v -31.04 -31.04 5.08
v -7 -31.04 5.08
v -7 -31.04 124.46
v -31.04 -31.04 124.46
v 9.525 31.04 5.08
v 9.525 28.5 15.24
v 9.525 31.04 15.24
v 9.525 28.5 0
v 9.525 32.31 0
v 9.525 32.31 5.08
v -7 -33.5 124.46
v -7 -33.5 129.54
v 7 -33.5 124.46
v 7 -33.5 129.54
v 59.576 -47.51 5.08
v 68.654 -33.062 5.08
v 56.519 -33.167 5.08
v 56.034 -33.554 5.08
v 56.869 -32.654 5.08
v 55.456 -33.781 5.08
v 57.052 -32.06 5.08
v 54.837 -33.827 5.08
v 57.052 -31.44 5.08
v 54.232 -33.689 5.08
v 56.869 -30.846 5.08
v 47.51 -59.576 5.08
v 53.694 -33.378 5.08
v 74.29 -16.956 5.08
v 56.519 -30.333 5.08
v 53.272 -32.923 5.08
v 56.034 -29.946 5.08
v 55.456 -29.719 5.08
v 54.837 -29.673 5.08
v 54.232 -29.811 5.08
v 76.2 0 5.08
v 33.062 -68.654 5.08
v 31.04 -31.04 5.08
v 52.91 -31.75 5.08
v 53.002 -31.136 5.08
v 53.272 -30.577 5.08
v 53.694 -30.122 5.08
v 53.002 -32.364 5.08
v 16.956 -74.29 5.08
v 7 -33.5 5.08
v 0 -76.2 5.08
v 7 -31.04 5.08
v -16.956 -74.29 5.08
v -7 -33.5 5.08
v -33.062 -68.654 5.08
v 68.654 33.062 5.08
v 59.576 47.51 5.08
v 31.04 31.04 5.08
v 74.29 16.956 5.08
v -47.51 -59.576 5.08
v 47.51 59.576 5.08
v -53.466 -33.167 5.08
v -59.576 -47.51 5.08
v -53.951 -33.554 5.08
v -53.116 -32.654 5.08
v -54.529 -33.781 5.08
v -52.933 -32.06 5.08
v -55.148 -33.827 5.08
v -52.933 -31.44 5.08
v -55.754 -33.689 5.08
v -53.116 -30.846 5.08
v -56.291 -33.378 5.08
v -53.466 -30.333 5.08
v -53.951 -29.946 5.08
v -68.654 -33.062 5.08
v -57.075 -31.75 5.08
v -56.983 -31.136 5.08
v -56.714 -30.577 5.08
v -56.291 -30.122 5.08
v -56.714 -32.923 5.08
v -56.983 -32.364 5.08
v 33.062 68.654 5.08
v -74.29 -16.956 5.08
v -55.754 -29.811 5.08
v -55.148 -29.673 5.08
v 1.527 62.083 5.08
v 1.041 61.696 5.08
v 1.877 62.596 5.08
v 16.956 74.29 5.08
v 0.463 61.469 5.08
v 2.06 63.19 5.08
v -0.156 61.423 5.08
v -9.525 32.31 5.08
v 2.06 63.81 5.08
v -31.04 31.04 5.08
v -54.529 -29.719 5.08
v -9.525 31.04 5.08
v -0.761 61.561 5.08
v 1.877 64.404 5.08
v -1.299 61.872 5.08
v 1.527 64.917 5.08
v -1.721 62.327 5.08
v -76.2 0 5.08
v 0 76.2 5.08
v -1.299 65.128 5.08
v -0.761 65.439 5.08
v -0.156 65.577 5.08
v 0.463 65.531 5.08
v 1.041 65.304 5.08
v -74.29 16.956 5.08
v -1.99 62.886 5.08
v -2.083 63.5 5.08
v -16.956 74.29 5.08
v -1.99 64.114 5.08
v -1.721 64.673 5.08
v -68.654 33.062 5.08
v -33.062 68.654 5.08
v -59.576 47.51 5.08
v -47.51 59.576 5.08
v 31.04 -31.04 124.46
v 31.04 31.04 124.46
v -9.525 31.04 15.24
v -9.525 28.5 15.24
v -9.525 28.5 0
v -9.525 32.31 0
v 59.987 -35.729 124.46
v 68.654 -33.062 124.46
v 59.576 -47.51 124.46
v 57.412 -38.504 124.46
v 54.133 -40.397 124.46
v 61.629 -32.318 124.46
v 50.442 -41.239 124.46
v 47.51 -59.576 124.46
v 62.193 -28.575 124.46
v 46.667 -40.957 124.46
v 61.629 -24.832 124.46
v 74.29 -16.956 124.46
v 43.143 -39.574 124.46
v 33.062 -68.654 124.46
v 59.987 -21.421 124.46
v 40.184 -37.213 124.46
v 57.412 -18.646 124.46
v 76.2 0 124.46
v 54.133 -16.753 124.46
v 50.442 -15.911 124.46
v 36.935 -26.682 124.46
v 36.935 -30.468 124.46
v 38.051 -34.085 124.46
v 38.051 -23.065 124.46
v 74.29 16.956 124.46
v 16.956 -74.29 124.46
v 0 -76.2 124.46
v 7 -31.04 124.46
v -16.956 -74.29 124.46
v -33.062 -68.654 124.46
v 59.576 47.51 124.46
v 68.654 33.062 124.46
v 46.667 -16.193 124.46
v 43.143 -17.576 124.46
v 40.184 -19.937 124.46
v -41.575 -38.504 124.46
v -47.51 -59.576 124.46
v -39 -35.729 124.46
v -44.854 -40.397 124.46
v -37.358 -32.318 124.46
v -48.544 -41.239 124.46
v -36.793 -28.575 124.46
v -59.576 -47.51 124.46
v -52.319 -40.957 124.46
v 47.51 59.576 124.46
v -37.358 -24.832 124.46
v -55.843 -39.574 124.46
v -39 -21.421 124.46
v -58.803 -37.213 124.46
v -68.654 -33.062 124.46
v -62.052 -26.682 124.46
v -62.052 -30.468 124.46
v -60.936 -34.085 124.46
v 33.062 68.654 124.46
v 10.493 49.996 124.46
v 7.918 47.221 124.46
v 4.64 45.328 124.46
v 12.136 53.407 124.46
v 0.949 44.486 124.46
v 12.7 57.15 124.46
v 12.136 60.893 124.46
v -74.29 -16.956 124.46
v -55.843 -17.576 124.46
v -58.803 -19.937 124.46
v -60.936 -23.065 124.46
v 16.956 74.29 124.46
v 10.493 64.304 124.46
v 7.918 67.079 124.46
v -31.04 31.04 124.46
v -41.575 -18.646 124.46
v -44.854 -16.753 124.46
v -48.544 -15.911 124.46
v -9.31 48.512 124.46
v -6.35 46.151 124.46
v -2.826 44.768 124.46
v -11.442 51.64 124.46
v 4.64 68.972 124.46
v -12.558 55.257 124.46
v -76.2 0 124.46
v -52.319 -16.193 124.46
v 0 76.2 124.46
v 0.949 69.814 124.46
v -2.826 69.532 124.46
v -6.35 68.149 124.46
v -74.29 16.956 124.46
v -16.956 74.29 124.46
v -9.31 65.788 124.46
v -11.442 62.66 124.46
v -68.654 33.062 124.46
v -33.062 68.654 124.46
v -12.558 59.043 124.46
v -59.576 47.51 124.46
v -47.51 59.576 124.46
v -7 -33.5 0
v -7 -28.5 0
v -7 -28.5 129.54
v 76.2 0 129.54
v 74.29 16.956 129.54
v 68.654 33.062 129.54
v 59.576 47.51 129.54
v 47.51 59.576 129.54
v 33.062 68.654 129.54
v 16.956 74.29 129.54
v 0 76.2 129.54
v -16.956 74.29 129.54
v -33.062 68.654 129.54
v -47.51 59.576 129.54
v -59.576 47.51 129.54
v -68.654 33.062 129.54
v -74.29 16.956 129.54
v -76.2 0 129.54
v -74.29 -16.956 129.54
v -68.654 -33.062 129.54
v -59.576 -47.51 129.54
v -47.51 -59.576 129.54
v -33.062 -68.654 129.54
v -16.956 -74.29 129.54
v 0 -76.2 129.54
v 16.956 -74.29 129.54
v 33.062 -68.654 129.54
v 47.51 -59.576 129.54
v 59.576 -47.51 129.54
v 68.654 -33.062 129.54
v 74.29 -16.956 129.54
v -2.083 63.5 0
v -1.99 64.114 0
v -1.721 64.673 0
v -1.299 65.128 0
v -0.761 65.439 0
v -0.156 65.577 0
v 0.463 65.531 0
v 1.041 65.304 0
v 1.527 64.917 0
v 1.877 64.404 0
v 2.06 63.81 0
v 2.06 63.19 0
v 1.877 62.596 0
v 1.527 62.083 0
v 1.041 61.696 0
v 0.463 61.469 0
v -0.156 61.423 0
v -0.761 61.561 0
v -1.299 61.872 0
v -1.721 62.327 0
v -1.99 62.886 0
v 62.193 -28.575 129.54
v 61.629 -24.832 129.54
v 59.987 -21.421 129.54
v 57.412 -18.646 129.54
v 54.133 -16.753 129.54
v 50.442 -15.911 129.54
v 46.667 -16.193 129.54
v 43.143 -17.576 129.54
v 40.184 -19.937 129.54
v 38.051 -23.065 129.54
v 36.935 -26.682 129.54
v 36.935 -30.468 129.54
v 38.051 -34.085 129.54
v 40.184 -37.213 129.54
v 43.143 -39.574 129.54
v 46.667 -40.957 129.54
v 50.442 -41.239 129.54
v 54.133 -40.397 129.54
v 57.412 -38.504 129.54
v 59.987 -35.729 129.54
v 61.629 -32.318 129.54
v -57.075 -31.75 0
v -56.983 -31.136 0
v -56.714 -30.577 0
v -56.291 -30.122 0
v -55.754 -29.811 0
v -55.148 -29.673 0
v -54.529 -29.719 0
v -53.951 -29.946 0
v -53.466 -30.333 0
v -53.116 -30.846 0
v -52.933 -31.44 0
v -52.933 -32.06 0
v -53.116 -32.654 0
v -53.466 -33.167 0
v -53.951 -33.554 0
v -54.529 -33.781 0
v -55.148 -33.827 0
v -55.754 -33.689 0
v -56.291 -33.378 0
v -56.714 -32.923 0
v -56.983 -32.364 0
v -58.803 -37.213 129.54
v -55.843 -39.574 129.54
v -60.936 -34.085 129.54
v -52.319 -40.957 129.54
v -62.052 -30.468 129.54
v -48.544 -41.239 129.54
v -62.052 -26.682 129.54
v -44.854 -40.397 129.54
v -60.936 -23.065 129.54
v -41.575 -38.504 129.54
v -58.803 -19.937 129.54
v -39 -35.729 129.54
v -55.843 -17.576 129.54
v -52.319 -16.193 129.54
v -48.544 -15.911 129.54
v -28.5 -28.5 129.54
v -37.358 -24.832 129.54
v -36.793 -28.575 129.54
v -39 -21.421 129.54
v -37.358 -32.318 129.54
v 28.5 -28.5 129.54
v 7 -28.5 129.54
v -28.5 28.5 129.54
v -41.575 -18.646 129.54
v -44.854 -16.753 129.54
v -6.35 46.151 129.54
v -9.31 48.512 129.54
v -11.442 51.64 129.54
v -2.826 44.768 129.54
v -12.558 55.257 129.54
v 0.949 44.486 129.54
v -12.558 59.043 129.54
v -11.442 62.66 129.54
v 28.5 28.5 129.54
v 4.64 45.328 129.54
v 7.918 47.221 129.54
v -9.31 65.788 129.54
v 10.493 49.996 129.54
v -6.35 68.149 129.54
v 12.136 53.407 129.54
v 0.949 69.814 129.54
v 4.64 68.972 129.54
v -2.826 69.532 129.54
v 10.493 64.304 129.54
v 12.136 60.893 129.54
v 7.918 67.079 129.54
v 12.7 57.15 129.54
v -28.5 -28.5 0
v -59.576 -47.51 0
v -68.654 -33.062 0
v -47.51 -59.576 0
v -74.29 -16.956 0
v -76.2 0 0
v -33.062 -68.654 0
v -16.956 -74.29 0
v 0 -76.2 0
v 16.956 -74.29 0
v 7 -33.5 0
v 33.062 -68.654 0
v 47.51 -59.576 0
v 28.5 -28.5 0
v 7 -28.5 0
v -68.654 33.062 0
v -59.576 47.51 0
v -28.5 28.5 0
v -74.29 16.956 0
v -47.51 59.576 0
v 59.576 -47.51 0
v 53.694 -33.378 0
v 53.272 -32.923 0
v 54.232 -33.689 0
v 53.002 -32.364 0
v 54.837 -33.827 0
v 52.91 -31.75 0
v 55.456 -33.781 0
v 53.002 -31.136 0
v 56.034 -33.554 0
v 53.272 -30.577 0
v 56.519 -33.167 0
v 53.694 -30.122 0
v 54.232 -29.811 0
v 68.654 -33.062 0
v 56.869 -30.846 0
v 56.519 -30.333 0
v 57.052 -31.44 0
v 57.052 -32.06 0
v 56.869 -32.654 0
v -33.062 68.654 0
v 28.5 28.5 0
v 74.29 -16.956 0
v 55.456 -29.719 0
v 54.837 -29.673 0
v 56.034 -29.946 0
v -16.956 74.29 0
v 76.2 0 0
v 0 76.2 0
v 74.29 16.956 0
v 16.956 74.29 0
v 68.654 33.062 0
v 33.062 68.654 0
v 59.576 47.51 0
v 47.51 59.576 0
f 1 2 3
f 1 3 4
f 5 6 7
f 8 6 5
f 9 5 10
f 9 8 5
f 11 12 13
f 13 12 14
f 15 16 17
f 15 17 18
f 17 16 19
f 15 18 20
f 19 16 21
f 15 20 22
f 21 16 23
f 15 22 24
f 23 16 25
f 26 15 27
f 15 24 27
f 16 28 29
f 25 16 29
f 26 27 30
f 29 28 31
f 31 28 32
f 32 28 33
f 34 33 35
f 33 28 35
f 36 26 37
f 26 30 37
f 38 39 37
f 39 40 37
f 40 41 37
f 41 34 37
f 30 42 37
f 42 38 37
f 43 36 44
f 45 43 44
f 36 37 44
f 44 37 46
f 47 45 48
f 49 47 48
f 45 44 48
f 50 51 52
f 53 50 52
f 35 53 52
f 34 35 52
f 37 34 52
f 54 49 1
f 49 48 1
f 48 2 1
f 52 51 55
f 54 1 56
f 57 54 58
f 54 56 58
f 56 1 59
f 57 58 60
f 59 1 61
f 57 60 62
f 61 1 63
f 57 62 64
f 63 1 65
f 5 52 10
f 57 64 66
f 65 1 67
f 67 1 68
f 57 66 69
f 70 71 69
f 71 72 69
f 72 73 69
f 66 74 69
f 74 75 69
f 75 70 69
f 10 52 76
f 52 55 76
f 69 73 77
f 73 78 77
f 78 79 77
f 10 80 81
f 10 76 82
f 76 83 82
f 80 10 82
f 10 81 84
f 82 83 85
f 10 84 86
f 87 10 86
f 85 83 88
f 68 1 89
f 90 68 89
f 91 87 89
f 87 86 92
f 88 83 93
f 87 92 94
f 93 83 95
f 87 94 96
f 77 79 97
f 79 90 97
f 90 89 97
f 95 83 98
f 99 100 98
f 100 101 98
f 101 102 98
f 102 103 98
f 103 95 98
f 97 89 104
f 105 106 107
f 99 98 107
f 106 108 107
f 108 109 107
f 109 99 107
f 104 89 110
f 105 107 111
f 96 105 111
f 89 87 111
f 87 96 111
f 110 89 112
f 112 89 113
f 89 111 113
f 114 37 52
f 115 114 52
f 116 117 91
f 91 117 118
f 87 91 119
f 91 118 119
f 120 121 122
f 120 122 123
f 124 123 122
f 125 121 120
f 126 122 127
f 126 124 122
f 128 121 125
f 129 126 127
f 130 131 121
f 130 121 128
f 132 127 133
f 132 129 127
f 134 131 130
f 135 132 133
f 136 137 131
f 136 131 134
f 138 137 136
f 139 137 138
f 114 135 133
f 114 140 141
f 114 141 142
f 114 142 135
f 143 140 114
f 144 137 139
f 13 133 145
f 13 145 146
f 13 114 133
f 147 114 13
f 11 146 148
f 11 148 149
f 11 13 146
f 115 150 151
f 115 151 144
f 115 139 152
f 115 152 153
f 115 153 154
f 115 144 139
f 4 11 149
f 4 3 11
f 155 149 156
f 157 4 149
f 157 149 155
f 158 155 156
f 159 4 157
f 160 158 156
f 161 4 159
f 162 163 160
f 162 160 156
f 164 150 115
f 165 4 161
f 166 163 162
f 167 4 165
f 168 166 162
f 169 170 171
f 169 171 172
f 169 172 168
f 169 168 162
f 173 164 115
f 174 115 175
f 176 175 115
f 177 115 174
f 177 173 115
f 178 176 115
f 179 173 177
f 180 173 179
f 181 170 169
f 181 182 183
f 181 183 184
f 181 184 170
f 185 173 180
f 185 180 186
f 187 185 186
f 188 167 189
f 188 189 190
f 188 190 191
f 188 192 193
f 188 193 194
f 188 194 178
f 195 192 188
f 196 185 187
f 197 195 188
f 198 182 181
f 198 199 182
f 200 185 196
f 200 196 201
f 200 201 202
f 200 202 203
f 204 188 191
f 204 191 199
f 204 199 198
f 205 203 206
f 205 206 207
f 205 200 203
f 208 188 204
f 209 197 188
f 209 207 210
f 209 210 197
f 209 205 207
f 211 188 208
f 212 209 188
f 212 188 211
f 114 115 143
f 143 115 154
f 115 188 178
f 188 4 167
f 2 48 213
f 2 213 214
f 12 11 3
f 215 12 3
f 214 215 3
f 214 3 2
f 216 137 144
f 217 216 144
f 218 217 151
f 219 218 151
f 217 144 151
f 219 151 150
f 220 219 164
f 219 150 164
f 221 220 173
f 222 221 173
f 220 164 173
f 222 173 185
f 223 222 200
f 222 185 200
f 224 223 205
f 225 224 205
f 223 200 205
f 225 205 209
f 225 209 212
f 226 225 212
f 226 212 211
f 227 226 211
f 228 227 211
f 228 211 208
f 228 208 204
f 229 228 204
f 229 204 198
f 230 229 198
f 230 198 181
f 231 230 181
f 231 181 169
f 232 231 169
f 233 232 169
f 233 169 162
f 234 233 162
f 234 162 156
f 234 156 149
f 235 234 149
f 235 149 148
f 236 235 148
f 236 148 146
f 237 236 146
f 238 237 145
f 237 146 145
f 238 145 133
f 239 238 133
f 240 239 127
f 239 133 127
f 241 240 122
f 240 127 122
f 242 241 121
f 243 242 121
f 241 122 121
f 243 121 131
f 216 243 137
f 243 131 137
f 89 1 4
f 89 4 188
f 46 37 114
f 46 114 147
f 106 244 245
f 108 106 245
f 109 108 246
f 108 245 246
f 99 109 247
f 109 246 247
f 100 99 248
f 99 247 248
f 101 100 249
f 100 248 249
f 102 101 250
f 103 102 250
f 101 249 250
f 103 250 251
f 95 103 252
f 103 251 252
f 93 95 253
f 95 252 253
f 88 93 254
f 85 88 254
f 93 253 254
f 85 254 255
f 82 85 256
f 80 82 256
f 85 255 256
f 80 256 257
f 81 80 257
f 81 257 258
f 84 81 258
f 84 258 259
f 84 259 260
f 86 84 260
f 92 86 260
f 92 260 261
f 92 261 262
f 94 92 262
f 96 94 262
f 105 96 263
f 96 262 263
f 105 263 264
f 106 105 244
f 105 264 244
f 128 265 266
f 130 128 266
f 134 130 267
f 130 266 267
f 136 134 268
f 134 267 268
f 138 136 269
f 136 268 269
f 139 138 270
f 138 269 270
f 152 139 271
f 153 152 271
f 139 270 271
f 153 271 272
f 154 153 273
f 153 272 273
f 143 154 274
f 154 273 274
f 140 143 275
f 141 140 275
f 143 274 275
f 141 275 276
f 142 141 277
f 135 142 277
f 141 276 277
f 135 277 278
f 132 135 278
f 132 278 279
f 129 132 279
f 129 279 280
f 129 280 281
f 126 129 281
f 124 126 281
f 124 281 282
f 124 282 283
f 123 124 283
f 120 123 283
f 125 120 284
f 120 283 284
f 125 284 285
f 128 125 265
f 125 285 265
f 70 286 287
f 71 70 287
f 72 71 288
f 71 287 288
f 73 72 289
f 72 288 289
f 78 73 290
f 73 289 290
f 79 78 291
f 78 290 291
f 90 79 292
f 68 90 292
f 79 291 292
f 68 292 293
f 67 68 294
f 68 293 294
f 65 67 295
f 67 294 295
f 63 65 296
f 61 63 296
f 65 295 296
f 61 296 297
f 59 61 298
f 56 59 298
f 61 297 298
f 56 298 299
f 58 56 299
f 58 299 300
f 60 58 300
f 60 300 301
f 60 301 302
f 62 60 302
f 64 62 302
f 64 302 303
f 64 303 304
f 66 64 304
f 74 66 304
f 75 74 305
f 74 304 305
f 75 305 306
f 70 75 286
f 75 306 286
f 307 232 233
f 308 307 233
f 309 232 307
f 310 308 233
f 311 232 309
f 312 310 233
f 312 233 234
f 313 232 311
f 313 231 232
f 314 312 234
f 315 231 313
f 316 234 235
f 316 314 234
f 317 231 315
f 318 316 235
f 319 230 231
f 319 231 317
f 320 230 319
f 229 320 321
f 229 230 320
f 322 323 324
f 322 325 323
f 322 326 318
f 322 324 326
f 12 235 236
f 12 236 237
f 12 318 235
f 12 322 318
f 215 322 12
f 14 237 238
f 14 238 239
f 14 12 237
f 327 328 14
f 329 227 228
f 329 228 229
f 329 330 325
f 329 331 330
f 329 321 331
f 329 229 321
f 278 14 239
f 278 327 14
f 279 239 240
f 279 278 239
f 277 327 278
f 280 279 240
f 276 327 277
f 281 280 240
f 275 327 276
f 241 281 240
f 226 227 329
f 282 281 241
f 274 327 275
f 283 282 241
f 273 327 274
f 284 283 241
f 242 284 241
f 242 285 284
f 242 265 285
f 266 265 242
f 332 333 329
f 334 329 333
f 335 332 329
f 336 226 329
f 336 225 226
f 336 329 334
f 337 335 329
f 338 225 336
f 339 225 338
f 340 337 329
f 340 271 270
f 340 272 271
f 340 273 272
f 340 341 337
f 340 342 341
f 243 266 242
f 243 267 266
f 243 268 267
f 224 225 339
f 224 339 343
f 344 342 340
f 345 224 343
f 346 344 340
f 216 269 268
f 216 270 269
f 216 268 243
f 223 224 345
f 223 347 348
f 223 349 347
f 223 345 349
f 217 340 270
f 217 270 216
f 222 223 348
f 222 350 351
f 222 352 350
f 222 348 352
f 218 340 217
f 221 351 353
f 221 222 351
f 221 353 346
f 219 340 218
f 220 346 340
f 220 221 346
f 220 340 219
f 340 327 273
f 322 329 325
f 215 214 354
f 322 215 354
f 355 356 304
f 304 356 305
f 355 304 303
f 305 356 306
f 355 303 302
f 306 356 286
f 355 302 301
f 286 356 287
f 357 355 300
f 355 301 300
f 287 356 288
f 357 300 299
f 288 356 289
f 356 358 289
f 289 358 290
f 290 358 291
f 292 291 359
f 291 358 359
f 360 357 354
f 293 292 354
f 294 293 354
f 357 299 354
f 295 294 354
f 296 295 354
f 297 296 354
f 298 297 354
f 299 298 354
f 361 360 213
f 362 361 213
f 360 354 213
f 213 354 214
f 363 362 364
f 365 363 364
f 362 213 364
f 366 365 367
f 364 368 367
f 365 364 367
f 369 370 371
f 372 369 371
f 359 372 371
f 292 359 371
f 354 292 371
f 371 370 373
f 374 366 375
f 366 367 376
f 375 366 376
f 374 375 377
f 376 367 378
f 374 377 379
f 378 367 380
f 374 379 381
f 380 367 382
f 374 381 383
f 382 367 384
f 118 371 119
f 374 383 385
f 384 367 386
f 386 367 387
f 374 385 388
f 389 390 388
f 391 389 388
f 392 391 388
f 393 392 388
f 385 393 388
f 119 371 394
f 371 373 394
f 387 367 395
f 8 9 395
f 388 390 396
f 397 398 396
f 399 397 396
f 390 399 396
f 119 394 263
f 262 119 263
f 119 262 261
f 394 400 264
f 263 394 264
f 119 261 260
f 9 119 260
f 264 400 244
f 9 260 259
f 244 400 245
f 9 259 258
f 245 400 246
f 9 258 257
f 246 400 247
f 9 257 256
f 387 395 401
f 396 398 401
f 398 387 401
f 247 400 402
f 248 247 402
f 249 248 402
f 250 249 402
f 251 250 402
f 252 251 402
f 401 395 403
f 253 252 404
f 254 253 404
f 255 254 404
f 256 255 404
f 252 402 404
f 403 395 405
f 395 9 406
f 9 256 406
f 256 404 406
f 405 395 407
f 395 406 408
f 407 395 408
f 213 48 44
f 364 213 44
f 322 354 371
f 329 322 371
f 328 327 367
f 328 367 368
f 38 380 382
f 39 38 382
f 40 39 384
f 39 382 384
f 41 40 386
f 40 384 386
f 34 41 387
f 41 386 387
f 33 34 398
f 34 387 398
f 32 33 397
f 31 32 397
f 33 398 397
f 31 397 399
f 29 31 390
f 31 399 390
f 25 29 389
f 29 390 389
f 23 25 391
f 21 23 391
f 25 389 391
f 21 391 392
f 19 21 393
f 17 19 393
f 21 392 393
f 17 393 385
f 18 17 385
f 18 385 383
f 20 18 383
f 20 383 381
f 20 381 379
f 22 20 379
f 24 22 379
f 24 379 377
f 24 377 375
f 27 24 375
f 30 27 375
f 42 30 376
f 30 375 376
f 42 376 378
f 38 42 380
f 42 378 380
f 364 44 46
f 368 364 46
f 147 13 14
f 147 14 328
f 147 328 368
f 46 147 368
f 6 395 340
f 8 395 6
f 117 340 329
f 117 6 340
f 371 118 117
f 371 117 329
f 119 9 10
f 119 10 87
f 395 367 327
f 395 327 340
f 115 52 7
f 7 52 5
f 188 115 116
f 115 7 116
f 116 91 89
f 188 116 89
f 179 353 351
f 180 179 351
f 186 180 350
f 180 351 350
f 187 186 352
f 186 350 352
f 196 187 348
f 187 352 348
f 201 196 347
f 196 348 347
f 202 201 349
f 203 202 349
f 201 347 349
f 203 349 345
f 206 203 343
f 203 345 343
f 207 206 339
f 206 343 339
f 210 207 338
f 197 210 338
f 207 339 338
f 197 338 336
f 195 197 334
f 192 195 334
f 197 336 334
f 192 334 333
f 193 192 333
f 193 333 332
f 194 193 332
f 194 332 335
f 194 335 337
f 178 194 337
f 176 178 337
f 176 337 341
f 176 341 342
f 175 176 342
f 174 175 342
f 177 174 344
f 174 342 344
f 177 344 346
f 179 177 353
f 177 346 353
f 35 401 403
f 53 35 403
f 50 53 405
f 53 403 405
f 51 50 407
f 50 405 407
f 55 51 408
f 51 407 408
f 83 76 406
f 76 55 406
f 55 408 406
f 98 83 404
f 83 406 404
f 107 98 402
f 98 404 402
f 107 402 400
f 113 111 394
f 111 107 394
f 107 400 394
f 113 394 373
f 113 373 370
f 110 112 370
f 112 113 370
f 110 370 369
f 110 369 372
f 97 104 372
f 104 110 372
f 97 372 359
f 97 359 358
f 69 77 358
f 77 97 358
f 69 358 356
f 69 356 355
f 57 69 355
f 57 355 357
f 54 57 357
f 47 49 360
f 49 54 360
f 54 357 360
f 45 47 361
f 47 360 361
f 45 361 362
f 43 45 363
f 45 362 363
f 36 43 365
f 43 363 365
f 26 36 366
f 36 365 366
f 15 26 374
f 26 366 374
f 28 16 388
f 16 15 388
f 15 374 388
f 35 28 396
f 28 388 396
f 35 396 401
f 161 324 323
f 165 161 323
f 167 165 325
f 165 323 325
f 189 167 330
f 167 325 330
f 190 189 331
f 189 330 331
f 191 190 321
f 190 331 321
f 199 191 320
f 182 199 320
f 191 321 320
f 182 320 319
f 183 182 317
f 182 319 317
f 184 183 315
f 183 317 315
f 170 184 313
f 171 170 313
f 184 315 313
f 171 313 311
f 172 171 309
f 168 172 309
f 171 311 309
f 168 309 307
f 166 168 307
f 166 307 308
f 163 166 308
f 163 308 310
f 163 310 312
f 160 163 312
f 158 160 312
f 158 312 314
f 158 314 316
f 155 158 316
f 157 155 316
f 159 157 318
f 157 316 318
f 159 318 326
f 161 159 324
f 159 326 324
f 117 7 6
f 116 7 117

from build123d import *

# Parameters (mm, degrees)
SKETCH1_R           = 76.2
BOSS_EXTRUDE1_DEPTH = 129.54
CUT_EXTRUDE1_START  = -5.08
SKETCH2_R           = 76.2
SKETCH2_W           = 62.08
SKETCH2_H           = 62.08
CUT_EXTRUDE1_DEPTH  = 119.38
SKETCH3_W           = 57
SKETCH3_H           = 57
CUT_EXTRUDE2_DEPTH  = 129.54
SKETCH4_R           = 2.0828
CUT_EXTRUDE3_DEPTH  = 5.08
SKETCH5_R           = 12.7
CUT_EXTRUDE4_DEPTH  = 5.08
SKETCH8_W           = 14
SKETCH8_H           = 5
CUT_EXTRUDE5_DEPTH  = 169.503684233
SKETCH9_W           = 19.05
SKETCH9_H           = 7.62
CUT_EXTRUDE6_DEPTH  = 15.24


with BuildPart() as part:
    # Sketch1 → Boss-Extrude1 (new body)
    with BuildSketch(Plane.XY):
        Circle(SKETCH1_R)
    extrude(amount=BOSS_EXTRUDE1_DEPTH)

    # Sketch2 → Cut-Extrude1 (cut)
    with BuildSketch(Plane(origin=(0, 0, 0), x_dir=(-1, 0, 0), z_dir=(0, 0, -1)).offset(CUT_EXTRUDE1_START)):
        Circle(SKETCH2_R)
        Rectangle(SKETCH2_W, SKETCH2_H, mode=Mode.SUBTRACT)
    extrude(amount=-CUT_EXTRUDE1_DEPTH, mode=Mode.SUBTRACT)

    # Sketch3 → Cut-Extrude2 (cut)
    with BuildSketch(Plane(origin=(0, 0, 0), x_dir=(-1, 0, 0), z_dir=(0, 0, -1))):
        Rectangle(SKETCH3_W, SKETCH3_H)
    extrude(amount=-CUT_EXTRUDE2_DEPTH, mode=Mode.SUBTRACT)

    # Sketch4 → Cut-Extrude3 (cut)
    with BuildSketch(Plane(origin=(0, 0, 0), x_dir=(-1, 0, 0), z_dir=(0, 0, -1))):
        with Locations((0, 63.5)):
            Circle(SKETCH4_R)
        with Locations((54.99261314, -31.75)):
            Circle(SKETCH4_R)
        with Locations((-54.99261314, -31.75)):
            Circle(SKETCH4_R)
    extrude(amount=-CUT_EXTRUDE3_DEPTH, mode=Mode.SUBTRACT)

    # Sketch5 → Cut-Extrude4 (cut)
    with BuildSketch(Plane.XY.offset(129.54)):
        with Locations((0, 57.15)):
            Circle(SKETCH5_R)
        with Locations((49.493351826, -28.575)):
            Circle(SKETCH5_R)
        with Locations((-49.493351826, -28.575)):
            Circle(SKETCH5_R)
    extrude(amount=-CUT_EXTRUDE4_DEPTH, mode=Mode.SUBTRACT)

    # Sketch8 → Cut-Extrude5 (cut, through all)
    with BuildSketch(Plane.XY.offset(129.54)):
        with Locations((0, -31)):
            Rectangle(SKETCH8_W, SKETCH8_H)
    extrude(amount=-CUT_EXTRUDE5_DEPTH, mode=Mode.SUBTRACT)

    # Sketch9 → Cut-Extrude6 (cut)
    with BuildSketch(Plane(origin=(0, 0, 0), x_dir=(-1, 0, 0), z_dir=(0, 0, -1))):
        with Locations((0, 28.5)):
            Rectangle(SKETCH9_W, SKETCH9_H)
    extrude(amount=-CUT_EXTRUDE6_DEPTH, mode=Mode.SUBTRACT)


solid = part.part
